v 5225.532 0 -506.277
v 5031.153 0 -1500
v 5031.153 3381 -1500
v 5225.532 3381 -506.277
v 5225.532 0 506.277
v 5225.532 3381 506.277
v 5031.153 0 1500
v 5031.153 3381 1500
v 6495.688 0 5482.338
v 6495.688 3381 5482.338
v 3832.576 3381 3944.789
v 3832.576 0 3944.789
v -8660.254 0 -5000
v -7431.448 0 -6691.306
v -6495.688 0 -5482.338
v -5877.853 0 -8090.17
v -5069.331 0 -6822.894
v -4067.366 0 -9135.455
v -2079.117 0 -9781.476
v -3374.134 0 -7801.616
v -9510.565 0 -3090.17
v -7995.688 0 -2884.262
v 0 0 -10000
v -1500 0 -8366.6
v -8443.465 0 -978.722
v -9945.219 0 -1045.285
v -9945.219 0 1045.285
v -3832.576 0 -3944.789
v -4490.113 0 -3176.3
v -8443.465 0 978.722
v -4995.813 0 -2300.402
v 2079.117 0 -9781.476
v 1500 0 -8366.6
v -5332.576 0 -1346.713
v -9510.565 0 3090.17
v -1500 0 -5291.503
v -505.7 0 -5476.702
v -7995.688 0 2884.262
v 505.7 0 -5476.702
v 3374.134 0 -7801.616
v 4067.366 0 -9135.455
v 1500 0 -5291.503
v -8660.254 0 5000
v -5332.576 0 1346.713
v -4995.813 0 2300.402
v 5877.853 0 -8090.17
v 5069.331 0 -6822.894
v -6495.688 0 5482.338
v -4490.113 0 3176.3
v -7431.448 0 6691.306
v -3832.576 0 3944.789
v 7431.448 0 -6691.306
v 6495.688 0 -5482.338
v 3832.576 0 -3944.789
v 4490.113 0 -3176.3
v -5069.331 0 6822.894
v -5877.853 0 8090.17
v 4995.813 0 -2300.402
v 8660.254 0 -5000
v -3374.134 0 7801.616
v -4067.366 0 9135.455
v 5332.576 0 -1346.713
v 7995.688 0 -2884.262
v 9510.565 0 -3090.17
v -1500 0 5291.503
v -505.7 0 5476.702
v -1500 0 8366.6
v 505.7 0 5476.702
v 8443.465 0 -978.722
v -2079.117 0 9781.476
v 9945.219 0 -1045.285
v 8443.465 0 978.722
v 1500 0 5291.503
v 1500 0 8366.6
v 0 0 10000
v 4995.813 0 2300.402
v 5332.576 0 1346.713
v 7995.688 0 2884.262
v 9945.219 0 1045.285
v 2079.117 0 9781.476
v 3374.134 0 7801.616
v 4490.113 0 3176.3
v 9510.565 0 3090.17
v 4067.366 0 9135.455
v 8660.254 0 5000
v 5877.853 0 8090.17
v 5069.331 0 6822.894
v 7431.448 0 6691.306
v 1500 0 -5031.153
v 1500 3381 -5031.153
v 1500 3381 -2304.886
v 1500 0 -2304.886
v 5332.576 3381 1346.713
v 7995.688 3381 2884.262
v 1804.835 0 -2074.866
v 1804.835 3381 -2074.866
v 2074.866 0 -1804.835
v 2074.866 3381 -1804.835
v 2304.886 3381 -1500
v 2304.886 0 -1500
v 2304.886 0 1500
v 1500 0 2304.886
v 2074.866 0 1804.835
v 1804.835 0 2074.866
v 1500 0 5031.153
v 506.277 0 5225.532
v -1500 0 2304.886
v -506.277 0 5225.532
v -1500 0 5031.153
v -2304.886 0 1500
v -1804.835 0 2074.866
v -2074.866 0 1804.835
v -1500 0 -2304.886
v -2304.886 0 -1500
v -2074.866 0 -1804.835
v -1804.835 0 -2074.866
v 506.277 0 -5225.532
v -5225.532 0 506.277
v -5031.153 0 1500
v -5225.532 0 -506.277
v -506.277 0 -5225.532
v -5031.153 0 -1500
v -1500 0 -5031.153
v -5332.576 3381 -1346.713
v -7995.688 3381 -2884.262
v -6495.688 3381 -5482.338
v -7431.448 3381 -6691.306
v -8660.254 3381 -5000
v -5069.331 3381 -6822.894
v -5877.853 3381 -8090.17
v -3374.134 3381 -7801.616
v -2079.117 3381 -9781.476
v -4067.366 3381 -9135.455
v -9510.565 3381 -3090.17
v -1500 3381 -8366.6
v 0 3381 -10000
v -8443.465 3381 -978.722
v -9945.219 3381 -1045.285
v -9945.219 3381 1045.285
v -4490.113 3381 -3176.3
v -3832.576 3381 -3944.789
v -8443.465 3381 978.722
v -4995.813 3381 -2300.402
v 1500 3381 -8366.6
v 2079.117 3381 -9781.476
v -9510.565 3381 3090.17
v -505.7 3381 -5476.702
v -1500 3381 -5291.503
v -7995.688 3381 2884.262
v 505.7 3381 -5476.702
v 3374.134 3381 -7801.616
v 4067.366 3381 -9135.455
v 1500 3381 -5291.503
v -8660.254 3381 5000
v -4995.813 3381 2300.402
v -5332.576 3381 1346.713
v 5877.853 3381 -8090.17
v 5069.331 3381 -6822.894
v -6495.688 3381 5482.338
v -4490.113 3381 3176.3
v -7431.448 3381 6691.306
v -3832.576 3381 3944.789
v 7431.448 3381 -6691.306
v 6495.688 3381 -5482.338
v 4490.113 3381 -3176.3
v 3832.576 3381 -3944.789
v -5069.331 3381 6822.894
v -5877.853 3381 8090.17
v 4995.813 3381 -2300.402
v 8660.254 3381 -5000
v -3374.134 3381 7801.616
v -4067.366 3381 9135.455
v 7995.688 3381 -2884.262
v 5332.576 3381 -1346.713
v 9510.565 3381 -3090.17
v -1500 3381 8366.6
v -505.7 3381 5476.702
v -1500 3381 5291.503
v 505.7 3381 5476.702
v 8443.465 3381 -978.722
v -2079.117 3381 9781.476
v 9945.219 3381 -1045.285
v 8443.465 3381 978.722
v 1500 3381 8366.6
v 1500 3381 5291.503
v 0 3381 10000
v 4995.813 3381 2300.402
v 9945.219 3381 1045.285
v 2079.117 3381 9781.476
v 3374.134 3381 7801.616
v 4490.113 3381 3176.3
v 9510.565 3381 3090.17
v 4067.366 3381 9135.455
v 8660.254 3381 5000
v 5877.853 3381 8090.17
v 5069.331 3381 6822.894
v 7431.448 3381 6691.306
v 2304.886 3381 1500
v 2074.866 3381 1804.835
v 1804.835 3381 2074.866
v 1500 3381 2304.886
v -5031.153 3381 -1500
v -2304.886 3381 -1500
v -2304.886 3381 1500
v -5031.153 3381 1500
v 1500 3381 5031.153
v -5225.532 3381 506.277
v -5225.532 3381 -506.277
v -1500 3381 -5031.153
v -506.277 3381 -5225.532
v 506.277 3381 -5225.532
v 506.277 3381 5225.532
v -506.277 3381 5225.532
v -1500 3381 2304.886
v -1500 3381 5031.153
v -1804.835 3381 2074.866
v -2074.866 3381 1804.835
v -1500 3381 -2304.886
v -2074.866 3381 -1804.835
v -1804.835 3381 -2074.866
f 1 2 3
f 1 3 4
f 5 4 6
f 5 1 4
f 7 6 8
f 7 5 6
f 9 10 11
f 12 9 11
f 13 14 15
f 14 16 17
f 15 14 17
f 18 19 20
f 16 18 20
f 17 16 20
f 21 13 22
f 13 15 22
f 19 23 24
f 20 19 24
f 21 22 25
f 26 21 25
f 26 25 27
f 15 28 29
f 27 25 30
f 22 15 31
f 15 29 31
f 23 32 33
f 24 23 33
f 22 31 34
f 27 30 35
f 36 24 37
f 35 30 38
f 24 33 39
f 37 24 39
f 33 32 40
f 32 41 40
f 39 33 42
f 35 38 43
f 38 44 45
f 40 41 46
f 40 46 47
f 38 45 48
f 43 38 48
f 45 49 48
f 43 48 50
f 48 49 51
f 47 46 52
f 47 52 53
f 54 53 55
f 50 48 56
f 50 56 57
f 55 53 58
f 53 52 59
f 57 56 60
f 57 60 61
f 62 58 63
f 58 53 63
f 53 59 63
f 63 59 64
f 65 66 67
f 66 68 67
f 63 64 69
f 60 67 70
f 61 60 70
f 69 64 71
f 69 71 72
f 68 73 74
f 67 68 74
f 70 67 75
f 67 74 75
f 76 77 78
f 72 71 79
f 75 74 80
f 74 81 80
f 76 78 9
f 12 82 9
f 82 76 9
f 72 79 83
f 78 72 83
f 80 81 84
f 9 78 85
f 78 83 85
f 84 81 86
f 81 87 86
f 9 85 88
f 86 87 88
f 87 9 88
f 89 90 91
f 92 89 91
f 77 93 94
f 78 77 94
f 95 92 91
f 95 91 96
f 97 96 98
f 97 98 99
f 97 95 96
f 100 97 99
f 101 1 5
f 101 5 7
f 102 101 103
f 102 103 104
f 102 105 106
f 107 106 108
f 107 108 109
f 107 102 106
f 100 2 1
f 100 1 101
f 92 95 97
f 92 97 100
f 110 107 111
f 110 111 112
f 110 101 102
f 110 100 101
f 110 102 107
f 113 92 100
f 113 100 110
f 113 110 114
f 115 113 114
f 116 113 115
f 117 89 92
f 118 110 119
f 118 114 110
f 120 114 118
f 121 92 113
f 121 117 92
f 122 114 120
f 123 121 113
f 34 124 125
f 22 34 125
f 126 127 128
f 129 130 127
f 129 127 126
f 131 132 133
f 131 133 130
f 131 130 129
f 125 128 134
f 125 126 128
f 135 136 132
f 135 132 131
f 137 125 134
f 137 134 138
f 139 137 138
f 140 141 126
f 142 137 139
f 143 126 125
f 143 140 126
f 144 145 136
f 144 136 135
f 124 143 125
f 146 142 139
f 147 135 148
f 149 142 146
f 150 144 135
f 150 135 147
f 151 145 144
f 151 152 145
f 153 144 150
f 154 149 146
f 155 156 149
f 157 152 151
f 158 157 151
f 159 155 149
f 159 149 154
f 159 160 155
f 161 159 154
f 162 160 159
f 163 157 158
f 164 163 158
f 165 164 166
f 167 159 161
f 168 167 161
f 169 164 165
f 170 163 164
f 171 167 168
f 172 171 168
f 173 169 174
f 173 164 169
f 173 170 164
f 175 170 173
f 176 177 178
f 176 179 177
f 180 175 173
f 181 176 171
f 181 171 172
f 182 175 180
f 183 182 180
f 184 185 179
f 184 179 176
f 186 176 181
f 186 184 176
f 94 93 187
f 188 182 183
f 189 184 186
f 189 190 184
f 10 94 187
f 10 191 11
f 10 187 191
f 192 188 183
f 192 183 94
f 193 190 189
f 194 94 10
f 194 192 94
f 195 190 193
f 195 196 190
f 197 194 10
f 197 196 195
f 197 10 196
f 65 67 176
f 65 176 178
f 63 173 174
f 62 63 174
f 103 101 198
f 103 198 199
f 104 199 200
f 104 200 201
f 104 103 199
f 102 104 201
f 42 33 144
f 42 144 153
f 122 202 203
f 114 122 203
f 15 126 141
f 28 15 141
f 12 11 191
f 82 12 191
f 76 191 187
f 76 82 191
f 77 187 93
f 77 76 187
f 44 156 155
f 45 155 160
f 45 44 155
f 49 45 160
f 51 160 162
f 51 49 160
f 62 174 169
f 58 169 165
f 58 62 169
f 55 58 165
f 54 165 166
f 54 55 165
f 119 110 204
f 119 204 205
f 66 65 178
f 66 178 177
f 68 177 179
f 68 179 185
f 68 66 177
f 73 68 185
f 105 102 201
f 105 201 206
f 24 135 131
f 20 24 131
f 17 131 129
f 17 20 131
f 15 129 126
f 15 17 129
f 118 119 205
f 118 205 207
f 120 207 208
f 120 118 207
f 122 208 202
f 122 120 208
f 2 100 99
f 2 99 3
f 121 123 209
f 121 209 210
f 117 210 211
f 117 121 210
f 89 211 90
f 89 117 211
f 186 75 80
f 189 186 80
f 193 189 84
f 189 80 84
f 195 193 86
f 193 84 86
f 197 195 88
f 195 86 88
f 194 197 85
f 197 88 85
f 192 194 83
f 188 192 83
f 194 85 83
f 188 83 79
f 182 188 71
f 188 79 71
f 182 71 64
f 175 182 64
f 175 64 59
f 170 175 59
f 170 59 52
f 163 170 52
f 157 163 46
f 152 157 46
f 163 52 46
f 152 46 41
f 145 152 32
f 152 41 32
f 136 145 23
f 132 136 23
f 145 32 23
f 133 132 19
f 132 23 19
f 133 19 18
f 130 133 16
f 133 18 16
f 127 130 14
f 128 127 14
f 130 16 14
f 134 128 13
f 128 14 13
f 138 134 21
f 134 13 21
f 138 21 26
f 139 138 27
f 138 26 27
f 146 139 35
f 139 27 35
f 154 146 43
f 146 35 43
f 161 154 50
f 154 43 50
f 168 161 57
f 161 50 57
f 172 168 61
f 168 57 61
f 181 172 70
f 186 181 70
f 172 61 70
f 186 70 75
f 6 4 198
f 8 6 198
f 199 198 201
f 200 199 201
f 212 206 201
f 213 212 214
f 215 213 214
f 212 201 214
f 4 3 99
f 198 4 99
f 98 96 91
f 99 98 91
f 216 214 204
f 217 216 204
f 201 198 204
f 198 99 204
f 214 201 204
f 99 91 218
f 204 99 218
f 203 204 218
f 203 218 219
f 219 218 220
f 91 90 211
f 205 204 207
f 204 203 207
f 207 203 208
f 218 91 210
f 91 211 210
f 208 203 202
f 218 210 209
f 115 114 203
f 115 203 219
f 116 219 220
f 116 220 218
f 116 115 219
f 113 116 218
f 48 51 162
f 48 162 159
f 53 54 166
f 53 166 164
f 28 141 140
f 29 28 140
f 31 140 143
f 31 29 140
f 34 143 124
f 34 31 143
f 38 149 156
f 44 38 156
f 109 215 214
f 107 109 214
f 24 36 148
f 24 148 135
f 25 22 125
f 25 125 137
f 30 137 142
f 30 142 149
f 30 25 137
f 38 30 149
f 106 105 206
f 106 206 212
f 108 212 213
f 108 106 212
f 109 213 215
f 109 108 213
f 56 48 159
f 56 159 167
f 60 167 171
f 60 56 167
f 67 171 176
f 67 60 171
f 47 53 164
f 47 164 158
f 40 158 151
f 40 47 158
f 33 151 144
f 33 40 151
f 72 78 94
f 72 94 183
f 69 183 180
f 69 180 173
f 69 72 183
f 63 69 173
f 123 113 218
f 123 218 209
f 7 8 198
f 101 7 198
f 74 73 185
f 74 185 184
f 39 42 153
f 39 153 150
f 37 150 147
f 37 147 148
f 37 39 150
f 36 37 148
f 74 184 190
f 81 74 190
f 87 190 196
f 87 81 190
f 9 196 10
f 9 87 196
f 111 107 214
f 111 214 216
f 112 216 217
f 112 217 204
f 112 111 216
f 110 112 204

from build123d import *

# Parameters (mm, degrees)
IZIM1_R                     = 10000
Y_KSEKLIK_EKSTR_ZYON4_DEPTH = 3381


with BuildPart() as part:
    # Çizim1 → Yükseklik-Ekstrüzyon4 (new body)
    # profile 1 of 3: a face of its own
    with BuildSketch(Plane(origin=(0, 0, 0), x_dir=(1, 0, 0), z_dir=(0, 1, 0))):
        with Locations(Location((0, 0, 0), (0, 0, 270))):
            Circle(IZIM1_R)
        with BuildLine():
            ThreePointArc((-6495.688373095, -5482.338238347), (-4250, -7361.215932168), (-1500, -8366.600265341))
            Line((-1500, -8366.600265341), (-1500, -5291.502622129))
            ThreePointArc((-1500, -5291.502622129), (0, -5500), (1500, -5291.502622129))
            Line((1500, -5291.502622129), (1500, -8366.600265341))
            ThreePointArc((1500, -8366.600265341), (4250, -7361.215932168), (6495.688373095, -5482.338238347))
            Line((6495.688373095, -5482.338238347), (3832.575694956, -3944.789416741))
            ThreePointArc((3832.575694956, -3944.789416741), (4763.139720814, -2750), (5332.575694956, -1346.713205388))
            Line((5332.575694956, -1346.713205388), (7995.688373095, -2884.262026994))
            ThreePointArc((7995.688373095, -2884.262026994), (8500, 0), (7995.688373095, 2884.262026994))
            Line((7995.688373095, 2884.262026994), (5332.575694956, 1346.713205388))
            ThreePointArc((5332.575694956, 1346.713205388), (4763.139720814, 2750), (3832.575694956, 3944.789416741))
            Line((3832.575694956, 3944.789416741), (6495.688373095, 5482.338238347))
            ThreePointArc((6495.688373095, 5482.338238347), (4250, 7361.215932168), (1500, 8366.600265341))
            Line((1500, 8366.600265341), (1500, 5291.502622129))
            ThreePointArc((1500, 5291.502622129), (0, 5500), (-1500, 5291.502622129))
            Line((-1500, 5291.502622129), (-1500, 8366.600265341))
            ThreePointArc((-1500, 8366.600265341), (-4250, 7361.215932168), (-6495.688373095, 5482.338238347))
            Line((-6495.688373095, 5482.338238347), (-3832.575694956, 3944.789416741))
            ThreePointArc((-3832.575694956, 3944.789416741), (-4763.139720814, 2750), (-5332.575694956, 1346.713205388))
            Line((-5332.575694956, 1346.713205388), (-7995.688373095, 2884.262026994))
            ThreePointArc((-7995.688373095, 2884.262026994), (-8500, 0), (-7995.688373095, -2884.262026994))
            Line((-7995.688373095, -2884.262026994), (-5332.575694956, -1346.713205388))
            ThreePointArc((-5332.575694956, -1346.713205388), (-4763.139720814, -2750), (-3832.575694956, -3944.789416741))
            Line((-3832.575694956, -3944.789416741), (-6495.688373095, -5482.338238347))
        make_face(mode=Mode.SUBTRACT)
    # profile 2 of 3: a face of its own
    with BuildSketch(Plane(origin=(0, 0, 0), x_dir=(1, 0, 0), z_dir=(0, 1, 0))):
        with BuildLine():
            Line((1500, -2304.886114323), (-1500, -2304.886114323))
            ThreePointArc((-1500, -2304.886114323), (-1944.543648263, -1944.543648263), (-2304.886114323, -1500))
            Line((-2304.886114323, -1500), (-5031.152949375, -1500))
            ThreePointArc((-5031.152949375, -1500), (-5250, 0), (-5031.152949375, 1500))
            Line((-5031.152949375, 1500), (-2304.886114323, 1500))
            ThreePointArc((-2304.886114323, 1500), (-1944.543648263, 1944.543648263), (-1500, 2304.886114323))
            Line((-1500, 2304.886114323), (-1500, 5031.152949375))
            ThreePointArc((-1500, 5031.152949375), (0, 5250), (1500, 5031.152949375))
            Line((1500, 5031.152949375), (1500, 2304.886114323))
            ThreePointArc((1500, 2304.886114323), (1944.543648263, 1944.543648263), (2304.886114323, 1500))
            Line((2304.886114323, 1500), (5031.152949375, 1500))
            ThreePointArc((5031.152949375, 1500), (5250, 0), (5031.152949375, -1500))
            Line((5031.152949375, -1500), (2304.886114323, -1500))
            ThreePointArc((2304.886114323, -1500), (1944.543648263, -1944.543648263), (1500, -2304.886114323))
        make_face()
    # profile 3 of 3: a face of its own
    with BuildSketch(Plane(origin=(0, 0, 0), x_dir=(1, 0, 0), z_dir=(0, 1, 0))):
        with BuildLine():
            Line((-1500, -5031.152949375), (-1500, -2304.886114323))
            Line((-1500, -2304.886114323), (1500, -2304.886114323))
            Line((1500, -2304.886114323), (1500, -5031.152949375))
            ThreePointArc((1500, -5031.152949375), (0, -5250), (-1500, -5031.152949375))
        make_face()
    extrude(amount=Y_KSEKLIK_EKSTR_ZYON4_DEPTH)


solid = part.part
